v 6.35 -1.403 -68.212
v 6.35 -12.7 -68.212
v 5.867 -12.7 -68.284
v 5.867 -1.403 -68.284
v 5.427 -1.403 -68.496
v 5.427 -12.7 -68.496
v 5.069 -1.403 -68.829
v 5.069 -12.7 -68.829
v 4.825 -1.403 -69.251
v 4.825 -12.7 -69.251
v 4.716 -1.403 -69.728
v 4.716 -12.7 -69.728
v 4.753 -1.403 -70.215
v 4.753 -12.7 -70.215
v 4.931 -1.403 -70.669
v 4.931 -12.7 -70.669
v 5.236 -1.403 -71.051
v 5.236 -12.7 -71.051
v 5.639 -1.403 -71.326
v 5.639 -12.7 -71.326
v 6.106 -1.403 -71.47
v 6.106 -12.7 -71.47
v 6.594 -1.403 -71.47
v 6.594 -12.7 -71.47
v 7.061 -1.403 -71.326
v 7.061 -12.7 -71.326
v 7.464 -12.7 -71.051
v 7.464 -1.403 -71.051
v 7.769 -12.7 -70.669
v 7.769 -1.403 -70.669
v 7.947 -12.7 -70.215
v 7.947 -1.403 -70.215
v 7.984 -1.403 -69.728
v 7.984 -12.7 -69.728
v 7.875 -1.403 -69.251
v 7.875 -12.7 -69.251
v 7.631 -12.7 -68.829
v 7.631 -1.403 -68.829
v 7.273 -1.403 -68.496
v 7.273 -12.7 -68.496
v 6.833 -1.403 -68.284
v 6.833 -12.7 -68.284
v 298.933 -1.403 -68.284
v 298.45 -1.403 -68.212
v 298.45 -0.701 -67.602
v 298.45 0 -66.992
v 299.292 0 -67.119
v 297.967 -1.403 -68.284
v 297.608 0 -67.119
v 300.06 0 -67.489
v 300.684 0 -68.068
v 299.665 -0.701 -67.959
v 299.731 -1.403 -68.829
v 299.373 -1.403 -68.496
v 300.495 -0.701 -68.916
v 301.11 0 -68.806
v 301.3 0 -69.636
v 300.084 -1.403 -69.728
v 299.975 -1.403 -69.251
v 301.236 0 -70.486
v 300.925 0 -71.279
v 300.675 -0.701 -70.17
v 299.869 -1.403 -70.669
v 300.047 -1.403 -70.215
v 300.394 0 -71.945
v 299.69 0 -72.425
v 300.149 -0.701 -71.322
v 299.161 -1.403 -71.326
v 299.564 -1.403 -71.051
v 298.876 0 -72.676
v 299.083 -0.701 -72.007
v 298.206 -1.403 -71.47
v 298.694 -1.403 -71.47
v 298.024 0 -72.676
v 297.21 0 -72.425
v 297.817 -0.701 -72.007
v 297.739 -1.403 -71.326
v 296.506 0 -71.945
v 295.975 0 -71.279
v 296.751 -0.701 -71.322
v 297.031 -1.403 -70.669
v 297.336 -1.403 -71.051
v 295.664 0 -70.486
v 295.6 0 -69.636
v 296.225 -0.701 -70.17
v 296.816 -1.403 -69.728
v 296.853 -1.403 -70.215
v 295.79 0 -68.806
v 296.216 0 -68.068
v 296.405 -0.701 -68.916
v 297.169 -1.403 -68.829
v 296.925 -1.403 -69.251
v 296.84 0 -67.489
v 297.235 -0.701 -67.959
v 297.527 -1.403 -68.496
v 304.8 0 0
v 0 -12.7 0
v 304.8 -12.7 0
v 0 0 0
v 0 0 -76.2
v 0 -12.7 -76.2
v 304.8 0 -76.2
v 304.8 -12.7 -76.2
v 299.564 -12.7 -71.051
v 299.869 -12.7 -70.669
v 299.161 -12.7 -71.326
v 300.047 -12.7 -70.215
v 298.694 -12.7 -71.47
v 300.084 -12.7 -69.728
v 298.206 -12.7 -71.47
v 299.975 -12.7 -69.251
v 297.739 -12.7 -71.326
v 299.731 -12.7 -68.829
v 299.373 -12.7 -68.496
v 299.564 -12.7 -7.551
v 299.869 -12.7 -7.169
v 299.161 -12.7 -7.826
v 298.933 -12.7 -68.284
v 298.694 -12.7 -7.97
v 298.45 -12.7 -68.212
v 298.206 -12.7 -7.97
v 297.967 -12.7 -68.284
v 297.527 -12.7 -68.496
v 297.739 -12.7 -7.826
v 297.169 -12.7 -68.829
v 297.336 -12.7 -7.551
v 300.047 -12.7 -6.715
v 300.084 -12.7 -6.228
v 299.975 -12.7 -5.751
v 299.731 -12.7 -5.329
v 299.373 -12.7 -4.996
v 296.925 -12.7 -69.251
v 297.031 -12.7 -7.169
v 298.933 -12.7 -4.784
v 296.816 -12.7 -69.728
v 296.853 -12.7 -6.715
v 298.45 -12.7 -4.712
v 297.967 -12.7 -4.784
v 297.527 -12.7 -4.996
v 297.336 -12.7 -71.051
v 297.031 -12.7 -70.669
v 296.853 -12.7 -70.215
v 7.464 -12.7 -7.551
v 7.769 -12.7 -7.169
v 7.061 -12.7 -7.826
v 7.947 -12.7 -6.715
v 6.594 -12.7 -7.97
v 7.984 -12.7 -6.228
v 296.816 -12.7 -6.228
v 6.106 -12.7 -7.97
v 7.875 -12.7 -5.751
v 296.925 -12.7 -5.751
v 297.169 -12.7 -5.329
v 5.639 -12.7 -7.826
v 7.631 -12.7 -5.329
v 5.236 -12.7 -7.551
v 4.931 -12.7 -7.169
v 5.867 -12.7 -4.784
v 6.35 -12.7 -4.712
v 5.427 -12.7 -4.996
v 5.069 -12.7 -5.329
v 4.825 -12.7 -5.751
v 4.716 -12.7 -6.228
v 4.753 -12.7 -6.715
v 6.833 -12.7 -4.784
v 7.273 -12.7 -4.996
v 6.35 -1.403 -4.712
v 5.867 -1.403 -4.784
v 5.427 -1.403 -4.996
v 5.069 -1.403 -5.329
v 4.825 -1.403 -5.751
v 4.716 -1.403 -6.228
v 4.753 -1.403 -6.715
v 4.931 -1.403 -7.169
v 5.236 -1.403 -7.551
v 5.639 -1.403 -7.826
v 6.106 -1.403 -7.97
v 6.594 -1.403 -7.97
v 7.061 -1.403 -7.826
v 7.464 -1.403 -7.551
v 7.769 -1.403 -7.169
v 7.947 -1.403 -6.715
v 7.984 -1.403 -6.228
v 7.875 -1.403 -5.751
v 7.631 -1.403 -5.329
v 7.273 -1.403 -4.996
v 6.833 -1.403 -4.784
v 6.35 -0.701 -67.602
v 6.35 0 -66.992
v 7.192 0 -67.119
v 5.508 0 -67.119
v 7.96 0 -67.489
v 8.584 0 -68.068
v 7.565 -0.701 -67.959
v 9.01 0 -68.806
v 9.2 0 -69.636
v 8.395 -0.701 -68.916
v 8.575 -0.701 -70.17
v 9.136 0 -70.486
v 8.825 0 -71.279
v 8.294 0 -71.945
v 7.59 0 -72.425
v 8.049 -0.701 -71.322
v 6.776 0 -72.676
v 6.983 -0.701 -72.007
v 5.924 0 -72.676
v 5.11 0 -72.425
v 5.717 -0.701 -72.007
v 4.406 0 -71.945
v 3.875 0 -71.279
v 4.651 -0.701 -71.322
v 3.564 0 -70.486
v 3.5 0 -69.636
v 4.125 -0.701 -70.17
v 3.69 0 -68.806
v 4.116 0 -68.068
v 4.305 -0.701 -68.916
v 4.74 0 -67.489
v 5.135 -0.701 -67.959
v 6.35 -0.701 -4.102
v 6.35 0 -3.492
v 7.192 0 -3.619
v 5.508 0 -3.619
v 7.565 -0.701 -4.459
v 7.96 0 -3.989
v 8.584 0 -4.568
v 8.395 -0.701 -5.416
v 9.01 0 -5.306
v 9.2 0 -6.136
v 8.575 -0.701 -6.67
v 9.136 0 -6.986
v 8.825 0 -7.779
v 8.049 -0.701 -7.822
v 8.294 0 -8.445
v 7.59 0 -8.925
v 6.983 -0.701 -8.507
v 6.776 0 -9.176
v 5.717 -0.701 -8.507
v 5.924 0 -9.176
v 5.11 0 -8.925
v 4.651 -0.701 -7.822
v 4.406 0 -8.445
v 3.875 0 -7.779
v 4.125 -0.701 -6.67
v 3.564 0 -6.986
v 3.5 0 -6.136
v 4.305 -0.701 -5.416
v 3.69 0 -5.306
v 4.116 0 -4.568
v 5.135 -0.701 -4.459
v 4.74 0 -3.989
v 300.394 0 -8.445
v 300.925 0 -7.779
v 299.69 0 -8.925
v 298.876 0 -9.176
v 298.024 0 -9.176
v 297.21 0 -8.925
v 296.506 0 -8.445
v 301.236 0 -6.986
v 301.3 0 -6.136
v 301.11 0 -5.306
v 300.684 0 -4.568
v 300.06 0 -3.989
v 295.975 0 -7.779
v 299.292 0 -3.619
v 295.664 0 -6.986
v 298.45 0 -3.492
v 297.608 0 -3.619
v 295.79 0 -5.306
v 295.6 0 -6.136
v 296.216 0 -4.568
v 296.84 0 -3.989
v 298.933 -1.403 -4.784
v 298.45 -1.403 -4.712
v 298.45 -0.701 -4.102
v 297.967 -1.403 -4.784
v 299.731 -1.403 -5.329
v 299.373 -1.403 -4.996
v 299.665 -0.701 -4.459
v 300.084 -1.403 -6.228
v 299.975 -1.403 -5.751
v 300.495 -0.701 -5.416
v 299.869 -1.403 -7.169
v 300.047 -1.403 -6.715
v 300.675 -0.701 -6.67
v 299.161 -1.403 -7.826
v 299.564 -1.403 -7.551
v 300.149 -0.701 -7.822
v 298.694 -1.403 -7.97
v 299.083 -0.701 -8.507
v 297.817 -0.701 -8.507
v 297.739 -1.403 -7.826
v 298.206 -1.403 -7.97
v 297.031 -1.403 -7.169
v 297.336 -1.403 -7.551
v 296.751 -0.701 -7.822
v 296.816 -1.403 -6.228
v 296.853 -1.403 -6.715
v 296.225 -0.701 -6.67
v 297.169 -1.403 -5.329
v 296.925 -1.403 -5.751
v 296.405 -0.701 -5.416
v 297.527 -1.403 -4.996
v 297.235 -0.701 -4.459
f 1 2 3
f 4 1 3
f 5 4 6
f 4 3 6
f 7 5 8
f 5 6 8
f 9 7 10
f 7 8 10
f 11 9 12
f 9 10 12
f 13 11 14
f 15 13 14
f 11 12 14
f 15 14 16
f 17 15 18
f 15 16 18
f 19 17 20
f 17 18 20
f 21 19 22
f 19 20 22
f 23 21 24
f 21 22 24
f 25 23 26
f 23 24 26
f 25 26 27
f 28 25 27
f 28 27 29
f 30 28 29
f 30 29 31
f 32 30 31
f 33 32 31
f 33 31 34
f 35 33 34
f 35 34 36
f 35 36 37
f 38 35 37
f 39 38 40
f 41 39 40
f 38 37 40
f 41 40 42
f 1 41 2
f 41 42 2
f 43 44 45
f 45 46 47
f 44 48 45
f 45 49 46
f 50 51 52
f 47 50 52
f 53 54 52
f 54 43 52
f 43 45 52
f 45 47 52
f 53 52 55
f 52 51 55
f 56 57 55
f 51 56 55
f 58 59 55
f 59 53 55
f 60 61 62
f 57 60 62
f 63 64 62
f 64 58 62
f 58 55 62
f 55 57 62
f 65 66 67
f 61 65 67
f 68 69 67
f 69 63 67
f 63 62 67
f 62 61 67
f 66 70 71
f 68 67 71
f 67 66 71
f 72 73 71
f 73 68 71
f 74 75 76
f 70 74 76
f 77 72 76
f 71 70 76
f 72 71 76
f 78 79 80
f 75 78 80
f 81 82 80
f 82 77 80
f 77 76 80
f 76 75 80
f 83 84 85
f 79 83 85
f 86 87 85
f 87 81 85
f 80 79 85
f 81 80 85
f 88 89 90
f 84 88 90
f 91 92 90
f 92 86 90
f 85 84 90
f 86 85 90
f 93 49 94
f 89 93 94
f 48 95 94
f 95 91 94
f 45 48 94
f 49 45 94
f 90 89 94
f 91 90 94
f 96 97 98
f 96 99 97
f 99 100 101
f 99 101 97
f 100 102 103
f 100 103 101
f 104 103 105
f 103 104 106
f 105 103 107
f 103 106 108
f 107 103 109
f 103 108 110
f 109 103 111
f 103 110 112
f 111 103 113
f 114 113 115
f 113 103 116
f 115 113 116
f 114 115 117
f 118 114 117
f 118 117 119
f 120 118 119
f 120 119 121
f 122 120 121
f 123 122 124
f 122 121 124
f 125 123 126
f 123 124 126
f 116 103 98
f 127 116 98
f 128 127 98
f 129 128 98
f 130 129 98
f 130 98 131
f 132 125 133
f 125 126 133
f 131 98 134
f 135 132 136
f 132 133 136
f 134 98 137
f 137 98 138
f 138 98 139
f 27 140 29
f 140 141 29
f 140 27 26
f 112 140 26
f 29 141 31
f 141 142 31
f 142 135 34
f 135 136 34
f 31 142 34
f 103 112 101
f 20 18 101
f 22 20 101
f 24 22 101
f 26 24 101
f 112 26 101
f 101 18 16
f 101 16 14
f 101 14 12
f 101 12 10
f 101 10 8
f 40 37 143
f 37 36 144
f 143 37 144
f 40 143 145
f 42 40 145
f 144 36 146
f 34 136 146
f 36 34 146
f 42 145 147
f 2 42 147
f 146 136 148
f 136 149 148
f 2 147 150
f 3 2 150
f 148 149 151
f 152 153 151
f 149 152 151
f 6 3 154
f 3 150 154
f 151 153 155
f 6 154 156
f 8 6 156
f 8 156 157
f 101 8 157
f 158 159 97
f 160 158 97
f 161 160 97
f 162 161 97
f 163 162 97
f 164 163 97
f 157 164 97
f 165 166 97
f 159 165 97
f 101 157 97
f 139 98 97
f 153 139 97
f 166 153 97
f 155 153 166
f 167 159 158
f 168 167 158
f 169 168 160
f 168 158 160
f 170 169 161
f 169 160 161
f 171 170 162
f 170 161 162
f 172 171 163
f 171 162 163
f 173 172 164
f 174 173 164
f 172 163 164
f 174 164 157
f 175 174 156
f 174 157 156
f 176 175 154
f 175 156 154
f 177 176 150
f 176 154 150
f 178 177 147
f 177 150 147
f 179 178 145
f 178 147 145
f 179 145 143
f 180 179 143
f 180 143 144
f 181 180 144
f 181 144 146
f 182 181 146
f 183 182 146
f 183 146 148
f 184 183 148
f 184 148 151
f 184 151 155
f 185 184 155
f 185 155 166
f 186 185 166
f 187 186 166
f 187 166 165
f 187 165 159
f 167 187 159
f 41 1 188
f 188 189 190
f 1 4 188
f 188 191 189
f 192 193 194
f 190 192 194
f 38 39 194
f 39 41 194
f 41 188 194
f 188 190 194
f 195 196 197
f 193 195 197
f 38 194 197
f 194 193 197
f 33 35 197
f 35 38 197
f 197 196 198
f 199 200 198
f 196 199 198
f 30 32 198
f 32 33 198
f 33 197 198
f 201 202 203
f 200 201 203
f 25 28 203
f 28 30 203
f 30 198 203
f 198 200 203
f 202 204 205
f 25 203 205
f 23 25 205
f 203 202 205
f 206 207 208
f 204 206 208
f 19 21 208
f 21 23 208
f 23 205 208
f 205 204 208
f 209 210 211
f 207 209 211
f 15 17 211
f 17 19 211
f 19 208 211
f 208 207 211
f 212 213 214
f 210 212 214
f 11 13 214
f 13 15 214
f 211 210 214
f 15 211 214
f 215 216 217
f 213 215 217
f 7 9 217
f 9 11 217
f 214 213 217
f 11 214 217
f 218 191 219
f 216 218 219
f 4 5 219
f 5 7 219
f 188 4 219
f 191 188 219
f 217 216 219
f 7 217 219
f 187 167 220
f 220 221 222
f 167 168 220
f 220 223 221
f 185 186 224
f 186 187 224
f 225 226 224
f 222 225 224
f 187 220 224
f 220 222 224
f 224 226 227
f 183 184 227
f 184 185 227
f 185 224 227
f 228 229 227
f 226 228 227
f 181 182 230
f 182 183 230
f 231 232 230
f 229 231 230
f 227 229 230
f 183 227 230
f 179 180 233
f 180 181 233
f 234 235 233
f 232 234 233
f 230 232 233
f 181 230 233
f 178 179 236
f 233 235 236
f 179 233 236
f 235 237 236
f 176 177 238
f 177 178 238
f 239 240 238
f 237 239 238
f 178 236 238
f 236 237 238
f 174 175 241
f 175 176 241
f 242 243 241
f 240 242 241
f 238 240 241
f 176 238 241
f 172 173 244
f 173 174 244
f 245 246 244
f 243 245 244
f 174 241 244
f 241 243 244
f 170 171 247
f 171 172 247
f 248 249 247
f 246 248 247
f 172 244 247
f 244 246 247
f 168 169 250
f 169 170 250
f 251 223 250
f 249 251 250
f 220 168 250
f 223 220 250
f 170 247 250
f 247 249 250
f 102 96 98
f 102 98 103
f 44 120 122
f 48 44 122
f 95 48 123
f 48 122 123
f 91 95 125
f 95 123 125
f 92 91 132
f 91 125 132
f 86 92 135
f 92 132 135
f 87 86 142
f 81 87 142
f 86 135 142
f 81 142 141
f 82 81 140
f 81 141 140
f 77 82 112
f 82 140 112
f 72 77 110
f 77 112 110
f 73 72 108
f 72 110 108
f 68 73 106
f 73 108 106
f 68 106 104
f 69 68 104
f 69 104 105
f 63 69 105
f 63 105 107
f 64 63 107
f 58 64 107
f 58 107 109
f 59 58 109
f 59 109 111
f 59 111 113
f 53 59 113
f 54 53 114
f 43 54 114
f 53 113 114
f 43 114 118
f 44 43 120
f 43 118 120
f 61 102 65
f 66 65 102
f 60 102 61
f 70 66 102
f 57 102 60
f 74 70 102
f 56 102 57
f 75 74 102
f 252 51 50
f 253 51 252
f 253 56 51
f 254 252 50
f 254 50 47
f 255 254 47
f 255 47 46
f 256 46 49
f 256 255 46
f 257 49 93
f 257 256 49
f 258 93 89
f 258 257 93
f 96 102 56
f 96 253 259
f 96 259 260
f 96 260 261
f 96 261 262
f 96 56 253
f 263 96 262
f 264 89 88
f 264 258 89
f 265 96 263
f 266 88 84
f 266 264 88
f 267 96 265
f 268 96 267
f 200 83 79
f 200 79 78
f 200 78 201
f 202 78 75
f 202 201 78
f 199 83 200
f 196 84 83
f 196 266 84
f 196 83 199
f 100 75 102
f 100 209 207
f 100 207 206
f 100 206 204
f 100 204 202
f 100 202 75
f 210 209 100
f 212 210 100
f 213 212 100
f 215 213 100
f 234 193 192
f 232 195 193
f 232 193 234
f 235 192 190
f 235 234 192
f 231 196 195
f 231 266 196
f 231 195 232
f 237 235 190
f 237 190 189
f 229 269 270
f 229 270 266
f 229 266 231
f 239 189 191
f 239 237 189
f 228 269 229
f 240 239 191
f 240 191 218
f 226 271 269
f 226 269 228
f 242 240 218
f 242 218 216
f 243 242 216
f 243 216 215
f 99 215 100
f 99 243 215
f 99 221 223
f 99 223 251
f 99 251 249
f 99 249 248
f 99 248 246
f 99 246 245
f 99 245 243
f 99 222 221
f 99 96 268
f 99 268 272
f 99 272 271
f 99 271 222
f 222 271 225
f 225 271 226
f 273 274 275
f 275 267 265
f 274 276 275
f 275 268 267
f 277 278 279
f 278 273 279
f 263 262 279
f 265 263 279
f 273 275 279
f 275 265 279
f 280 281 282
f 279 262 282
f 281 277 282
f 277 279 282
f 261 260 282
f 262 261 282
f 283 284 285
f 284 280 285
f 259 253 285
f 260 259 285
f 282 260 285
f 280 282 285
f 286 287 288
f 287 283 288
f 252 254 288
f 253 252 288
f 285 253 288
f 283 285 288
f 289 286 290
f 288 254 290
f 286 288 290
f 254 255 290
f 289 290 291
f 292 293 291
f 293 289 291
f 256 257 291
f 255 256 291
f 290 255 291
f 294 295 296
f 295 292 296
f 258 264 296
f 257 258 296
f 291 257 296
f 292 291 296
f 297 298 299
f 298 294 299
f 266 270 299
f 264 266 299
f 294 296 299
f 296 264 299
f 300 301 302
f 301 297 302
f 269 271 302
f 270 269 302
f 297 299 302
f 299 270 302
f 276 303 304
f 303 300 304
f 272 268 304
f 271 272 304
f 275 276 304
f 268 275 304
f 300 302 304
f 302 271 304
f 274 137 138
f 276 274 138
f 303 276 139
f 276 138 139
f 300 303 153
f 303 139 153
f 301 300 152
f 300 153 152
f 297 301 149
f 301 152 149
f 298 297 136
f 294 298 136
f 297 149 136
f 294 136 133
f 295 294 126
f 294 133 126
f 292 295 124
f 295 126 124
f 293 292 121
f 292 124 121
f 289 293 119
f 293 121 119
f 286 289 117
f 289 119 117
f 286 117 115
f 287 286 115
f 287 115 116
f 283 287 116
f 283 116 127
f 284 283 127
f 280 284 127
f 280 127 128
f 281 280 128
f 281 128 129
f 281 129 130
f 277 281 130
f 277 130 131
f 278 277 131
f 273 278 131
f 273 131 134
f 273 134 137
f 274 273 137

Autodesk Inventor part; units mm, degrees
ref_plane "YZ Plane" through (0, 0, 0) normal (1, 0, 0) x (0, 1, 0)
ref_plane "XZ Plane" through (0, 0, 0) normal (0, 1, 0) x (-1, 0, 0)
ref_plane "XY Plane" through (0, 0, 0) normal (0, 0, 1) x (1, 0, 0)
sketch "Sketch1" plane through (0, 0, 0) normal (0, 1, 0) x (-1, 0, 0)
  line L0 (0, 0) -> (-304.8, 0)
  line L1 (-304.8, 0) -> (-304.8, -76.2)
  line L2 (-304.8, -76.2) -> (0, -76.2)
  line L3 (0, -76.2) -> (0, 0)
  circle A0 centre (-6.35, -69.85) radius 1.3891
  circle A1 centre (-6.35, -6.35) radius 1.3891
  circle A2 centre (-298.45, -6.35) radius 1.3891
  circle A3 centre (-298.45, -69.85) radius 1.3891
  dimension "d0" = 76.2
  dimension "d1" = 304.8
  dimension "d4" = 2.7781
  dimension "d5" = 6.35
  dimension "d6" = 6.35
  dimension "d7" = 6.35
  dimension "d8" = 6.35
extrude "Extrusion1" add sketch "Sketch1" against normal blind 12.7 contours L3 L2 L1 L0 | A0 | A1 | A2 | A3
hole "Hole1" at (6.35, 0, -69.85) at (298.45, 0, -69.85) at (298.45, 0, -6.35) at (6.35, 0, -6.35) direction (0, -1, 0) diameter 3.2766 end through all countersink diameter 5.715 countersink angle 82 clearance for "Flat Head Machine Screw (82)" size "#4" standard "Ansi Unified Screw Threads"
equation "\"d7\" = d5"
equation "\"d8\" = d6"
properties material "MDF Medium Density Fiberboard"
